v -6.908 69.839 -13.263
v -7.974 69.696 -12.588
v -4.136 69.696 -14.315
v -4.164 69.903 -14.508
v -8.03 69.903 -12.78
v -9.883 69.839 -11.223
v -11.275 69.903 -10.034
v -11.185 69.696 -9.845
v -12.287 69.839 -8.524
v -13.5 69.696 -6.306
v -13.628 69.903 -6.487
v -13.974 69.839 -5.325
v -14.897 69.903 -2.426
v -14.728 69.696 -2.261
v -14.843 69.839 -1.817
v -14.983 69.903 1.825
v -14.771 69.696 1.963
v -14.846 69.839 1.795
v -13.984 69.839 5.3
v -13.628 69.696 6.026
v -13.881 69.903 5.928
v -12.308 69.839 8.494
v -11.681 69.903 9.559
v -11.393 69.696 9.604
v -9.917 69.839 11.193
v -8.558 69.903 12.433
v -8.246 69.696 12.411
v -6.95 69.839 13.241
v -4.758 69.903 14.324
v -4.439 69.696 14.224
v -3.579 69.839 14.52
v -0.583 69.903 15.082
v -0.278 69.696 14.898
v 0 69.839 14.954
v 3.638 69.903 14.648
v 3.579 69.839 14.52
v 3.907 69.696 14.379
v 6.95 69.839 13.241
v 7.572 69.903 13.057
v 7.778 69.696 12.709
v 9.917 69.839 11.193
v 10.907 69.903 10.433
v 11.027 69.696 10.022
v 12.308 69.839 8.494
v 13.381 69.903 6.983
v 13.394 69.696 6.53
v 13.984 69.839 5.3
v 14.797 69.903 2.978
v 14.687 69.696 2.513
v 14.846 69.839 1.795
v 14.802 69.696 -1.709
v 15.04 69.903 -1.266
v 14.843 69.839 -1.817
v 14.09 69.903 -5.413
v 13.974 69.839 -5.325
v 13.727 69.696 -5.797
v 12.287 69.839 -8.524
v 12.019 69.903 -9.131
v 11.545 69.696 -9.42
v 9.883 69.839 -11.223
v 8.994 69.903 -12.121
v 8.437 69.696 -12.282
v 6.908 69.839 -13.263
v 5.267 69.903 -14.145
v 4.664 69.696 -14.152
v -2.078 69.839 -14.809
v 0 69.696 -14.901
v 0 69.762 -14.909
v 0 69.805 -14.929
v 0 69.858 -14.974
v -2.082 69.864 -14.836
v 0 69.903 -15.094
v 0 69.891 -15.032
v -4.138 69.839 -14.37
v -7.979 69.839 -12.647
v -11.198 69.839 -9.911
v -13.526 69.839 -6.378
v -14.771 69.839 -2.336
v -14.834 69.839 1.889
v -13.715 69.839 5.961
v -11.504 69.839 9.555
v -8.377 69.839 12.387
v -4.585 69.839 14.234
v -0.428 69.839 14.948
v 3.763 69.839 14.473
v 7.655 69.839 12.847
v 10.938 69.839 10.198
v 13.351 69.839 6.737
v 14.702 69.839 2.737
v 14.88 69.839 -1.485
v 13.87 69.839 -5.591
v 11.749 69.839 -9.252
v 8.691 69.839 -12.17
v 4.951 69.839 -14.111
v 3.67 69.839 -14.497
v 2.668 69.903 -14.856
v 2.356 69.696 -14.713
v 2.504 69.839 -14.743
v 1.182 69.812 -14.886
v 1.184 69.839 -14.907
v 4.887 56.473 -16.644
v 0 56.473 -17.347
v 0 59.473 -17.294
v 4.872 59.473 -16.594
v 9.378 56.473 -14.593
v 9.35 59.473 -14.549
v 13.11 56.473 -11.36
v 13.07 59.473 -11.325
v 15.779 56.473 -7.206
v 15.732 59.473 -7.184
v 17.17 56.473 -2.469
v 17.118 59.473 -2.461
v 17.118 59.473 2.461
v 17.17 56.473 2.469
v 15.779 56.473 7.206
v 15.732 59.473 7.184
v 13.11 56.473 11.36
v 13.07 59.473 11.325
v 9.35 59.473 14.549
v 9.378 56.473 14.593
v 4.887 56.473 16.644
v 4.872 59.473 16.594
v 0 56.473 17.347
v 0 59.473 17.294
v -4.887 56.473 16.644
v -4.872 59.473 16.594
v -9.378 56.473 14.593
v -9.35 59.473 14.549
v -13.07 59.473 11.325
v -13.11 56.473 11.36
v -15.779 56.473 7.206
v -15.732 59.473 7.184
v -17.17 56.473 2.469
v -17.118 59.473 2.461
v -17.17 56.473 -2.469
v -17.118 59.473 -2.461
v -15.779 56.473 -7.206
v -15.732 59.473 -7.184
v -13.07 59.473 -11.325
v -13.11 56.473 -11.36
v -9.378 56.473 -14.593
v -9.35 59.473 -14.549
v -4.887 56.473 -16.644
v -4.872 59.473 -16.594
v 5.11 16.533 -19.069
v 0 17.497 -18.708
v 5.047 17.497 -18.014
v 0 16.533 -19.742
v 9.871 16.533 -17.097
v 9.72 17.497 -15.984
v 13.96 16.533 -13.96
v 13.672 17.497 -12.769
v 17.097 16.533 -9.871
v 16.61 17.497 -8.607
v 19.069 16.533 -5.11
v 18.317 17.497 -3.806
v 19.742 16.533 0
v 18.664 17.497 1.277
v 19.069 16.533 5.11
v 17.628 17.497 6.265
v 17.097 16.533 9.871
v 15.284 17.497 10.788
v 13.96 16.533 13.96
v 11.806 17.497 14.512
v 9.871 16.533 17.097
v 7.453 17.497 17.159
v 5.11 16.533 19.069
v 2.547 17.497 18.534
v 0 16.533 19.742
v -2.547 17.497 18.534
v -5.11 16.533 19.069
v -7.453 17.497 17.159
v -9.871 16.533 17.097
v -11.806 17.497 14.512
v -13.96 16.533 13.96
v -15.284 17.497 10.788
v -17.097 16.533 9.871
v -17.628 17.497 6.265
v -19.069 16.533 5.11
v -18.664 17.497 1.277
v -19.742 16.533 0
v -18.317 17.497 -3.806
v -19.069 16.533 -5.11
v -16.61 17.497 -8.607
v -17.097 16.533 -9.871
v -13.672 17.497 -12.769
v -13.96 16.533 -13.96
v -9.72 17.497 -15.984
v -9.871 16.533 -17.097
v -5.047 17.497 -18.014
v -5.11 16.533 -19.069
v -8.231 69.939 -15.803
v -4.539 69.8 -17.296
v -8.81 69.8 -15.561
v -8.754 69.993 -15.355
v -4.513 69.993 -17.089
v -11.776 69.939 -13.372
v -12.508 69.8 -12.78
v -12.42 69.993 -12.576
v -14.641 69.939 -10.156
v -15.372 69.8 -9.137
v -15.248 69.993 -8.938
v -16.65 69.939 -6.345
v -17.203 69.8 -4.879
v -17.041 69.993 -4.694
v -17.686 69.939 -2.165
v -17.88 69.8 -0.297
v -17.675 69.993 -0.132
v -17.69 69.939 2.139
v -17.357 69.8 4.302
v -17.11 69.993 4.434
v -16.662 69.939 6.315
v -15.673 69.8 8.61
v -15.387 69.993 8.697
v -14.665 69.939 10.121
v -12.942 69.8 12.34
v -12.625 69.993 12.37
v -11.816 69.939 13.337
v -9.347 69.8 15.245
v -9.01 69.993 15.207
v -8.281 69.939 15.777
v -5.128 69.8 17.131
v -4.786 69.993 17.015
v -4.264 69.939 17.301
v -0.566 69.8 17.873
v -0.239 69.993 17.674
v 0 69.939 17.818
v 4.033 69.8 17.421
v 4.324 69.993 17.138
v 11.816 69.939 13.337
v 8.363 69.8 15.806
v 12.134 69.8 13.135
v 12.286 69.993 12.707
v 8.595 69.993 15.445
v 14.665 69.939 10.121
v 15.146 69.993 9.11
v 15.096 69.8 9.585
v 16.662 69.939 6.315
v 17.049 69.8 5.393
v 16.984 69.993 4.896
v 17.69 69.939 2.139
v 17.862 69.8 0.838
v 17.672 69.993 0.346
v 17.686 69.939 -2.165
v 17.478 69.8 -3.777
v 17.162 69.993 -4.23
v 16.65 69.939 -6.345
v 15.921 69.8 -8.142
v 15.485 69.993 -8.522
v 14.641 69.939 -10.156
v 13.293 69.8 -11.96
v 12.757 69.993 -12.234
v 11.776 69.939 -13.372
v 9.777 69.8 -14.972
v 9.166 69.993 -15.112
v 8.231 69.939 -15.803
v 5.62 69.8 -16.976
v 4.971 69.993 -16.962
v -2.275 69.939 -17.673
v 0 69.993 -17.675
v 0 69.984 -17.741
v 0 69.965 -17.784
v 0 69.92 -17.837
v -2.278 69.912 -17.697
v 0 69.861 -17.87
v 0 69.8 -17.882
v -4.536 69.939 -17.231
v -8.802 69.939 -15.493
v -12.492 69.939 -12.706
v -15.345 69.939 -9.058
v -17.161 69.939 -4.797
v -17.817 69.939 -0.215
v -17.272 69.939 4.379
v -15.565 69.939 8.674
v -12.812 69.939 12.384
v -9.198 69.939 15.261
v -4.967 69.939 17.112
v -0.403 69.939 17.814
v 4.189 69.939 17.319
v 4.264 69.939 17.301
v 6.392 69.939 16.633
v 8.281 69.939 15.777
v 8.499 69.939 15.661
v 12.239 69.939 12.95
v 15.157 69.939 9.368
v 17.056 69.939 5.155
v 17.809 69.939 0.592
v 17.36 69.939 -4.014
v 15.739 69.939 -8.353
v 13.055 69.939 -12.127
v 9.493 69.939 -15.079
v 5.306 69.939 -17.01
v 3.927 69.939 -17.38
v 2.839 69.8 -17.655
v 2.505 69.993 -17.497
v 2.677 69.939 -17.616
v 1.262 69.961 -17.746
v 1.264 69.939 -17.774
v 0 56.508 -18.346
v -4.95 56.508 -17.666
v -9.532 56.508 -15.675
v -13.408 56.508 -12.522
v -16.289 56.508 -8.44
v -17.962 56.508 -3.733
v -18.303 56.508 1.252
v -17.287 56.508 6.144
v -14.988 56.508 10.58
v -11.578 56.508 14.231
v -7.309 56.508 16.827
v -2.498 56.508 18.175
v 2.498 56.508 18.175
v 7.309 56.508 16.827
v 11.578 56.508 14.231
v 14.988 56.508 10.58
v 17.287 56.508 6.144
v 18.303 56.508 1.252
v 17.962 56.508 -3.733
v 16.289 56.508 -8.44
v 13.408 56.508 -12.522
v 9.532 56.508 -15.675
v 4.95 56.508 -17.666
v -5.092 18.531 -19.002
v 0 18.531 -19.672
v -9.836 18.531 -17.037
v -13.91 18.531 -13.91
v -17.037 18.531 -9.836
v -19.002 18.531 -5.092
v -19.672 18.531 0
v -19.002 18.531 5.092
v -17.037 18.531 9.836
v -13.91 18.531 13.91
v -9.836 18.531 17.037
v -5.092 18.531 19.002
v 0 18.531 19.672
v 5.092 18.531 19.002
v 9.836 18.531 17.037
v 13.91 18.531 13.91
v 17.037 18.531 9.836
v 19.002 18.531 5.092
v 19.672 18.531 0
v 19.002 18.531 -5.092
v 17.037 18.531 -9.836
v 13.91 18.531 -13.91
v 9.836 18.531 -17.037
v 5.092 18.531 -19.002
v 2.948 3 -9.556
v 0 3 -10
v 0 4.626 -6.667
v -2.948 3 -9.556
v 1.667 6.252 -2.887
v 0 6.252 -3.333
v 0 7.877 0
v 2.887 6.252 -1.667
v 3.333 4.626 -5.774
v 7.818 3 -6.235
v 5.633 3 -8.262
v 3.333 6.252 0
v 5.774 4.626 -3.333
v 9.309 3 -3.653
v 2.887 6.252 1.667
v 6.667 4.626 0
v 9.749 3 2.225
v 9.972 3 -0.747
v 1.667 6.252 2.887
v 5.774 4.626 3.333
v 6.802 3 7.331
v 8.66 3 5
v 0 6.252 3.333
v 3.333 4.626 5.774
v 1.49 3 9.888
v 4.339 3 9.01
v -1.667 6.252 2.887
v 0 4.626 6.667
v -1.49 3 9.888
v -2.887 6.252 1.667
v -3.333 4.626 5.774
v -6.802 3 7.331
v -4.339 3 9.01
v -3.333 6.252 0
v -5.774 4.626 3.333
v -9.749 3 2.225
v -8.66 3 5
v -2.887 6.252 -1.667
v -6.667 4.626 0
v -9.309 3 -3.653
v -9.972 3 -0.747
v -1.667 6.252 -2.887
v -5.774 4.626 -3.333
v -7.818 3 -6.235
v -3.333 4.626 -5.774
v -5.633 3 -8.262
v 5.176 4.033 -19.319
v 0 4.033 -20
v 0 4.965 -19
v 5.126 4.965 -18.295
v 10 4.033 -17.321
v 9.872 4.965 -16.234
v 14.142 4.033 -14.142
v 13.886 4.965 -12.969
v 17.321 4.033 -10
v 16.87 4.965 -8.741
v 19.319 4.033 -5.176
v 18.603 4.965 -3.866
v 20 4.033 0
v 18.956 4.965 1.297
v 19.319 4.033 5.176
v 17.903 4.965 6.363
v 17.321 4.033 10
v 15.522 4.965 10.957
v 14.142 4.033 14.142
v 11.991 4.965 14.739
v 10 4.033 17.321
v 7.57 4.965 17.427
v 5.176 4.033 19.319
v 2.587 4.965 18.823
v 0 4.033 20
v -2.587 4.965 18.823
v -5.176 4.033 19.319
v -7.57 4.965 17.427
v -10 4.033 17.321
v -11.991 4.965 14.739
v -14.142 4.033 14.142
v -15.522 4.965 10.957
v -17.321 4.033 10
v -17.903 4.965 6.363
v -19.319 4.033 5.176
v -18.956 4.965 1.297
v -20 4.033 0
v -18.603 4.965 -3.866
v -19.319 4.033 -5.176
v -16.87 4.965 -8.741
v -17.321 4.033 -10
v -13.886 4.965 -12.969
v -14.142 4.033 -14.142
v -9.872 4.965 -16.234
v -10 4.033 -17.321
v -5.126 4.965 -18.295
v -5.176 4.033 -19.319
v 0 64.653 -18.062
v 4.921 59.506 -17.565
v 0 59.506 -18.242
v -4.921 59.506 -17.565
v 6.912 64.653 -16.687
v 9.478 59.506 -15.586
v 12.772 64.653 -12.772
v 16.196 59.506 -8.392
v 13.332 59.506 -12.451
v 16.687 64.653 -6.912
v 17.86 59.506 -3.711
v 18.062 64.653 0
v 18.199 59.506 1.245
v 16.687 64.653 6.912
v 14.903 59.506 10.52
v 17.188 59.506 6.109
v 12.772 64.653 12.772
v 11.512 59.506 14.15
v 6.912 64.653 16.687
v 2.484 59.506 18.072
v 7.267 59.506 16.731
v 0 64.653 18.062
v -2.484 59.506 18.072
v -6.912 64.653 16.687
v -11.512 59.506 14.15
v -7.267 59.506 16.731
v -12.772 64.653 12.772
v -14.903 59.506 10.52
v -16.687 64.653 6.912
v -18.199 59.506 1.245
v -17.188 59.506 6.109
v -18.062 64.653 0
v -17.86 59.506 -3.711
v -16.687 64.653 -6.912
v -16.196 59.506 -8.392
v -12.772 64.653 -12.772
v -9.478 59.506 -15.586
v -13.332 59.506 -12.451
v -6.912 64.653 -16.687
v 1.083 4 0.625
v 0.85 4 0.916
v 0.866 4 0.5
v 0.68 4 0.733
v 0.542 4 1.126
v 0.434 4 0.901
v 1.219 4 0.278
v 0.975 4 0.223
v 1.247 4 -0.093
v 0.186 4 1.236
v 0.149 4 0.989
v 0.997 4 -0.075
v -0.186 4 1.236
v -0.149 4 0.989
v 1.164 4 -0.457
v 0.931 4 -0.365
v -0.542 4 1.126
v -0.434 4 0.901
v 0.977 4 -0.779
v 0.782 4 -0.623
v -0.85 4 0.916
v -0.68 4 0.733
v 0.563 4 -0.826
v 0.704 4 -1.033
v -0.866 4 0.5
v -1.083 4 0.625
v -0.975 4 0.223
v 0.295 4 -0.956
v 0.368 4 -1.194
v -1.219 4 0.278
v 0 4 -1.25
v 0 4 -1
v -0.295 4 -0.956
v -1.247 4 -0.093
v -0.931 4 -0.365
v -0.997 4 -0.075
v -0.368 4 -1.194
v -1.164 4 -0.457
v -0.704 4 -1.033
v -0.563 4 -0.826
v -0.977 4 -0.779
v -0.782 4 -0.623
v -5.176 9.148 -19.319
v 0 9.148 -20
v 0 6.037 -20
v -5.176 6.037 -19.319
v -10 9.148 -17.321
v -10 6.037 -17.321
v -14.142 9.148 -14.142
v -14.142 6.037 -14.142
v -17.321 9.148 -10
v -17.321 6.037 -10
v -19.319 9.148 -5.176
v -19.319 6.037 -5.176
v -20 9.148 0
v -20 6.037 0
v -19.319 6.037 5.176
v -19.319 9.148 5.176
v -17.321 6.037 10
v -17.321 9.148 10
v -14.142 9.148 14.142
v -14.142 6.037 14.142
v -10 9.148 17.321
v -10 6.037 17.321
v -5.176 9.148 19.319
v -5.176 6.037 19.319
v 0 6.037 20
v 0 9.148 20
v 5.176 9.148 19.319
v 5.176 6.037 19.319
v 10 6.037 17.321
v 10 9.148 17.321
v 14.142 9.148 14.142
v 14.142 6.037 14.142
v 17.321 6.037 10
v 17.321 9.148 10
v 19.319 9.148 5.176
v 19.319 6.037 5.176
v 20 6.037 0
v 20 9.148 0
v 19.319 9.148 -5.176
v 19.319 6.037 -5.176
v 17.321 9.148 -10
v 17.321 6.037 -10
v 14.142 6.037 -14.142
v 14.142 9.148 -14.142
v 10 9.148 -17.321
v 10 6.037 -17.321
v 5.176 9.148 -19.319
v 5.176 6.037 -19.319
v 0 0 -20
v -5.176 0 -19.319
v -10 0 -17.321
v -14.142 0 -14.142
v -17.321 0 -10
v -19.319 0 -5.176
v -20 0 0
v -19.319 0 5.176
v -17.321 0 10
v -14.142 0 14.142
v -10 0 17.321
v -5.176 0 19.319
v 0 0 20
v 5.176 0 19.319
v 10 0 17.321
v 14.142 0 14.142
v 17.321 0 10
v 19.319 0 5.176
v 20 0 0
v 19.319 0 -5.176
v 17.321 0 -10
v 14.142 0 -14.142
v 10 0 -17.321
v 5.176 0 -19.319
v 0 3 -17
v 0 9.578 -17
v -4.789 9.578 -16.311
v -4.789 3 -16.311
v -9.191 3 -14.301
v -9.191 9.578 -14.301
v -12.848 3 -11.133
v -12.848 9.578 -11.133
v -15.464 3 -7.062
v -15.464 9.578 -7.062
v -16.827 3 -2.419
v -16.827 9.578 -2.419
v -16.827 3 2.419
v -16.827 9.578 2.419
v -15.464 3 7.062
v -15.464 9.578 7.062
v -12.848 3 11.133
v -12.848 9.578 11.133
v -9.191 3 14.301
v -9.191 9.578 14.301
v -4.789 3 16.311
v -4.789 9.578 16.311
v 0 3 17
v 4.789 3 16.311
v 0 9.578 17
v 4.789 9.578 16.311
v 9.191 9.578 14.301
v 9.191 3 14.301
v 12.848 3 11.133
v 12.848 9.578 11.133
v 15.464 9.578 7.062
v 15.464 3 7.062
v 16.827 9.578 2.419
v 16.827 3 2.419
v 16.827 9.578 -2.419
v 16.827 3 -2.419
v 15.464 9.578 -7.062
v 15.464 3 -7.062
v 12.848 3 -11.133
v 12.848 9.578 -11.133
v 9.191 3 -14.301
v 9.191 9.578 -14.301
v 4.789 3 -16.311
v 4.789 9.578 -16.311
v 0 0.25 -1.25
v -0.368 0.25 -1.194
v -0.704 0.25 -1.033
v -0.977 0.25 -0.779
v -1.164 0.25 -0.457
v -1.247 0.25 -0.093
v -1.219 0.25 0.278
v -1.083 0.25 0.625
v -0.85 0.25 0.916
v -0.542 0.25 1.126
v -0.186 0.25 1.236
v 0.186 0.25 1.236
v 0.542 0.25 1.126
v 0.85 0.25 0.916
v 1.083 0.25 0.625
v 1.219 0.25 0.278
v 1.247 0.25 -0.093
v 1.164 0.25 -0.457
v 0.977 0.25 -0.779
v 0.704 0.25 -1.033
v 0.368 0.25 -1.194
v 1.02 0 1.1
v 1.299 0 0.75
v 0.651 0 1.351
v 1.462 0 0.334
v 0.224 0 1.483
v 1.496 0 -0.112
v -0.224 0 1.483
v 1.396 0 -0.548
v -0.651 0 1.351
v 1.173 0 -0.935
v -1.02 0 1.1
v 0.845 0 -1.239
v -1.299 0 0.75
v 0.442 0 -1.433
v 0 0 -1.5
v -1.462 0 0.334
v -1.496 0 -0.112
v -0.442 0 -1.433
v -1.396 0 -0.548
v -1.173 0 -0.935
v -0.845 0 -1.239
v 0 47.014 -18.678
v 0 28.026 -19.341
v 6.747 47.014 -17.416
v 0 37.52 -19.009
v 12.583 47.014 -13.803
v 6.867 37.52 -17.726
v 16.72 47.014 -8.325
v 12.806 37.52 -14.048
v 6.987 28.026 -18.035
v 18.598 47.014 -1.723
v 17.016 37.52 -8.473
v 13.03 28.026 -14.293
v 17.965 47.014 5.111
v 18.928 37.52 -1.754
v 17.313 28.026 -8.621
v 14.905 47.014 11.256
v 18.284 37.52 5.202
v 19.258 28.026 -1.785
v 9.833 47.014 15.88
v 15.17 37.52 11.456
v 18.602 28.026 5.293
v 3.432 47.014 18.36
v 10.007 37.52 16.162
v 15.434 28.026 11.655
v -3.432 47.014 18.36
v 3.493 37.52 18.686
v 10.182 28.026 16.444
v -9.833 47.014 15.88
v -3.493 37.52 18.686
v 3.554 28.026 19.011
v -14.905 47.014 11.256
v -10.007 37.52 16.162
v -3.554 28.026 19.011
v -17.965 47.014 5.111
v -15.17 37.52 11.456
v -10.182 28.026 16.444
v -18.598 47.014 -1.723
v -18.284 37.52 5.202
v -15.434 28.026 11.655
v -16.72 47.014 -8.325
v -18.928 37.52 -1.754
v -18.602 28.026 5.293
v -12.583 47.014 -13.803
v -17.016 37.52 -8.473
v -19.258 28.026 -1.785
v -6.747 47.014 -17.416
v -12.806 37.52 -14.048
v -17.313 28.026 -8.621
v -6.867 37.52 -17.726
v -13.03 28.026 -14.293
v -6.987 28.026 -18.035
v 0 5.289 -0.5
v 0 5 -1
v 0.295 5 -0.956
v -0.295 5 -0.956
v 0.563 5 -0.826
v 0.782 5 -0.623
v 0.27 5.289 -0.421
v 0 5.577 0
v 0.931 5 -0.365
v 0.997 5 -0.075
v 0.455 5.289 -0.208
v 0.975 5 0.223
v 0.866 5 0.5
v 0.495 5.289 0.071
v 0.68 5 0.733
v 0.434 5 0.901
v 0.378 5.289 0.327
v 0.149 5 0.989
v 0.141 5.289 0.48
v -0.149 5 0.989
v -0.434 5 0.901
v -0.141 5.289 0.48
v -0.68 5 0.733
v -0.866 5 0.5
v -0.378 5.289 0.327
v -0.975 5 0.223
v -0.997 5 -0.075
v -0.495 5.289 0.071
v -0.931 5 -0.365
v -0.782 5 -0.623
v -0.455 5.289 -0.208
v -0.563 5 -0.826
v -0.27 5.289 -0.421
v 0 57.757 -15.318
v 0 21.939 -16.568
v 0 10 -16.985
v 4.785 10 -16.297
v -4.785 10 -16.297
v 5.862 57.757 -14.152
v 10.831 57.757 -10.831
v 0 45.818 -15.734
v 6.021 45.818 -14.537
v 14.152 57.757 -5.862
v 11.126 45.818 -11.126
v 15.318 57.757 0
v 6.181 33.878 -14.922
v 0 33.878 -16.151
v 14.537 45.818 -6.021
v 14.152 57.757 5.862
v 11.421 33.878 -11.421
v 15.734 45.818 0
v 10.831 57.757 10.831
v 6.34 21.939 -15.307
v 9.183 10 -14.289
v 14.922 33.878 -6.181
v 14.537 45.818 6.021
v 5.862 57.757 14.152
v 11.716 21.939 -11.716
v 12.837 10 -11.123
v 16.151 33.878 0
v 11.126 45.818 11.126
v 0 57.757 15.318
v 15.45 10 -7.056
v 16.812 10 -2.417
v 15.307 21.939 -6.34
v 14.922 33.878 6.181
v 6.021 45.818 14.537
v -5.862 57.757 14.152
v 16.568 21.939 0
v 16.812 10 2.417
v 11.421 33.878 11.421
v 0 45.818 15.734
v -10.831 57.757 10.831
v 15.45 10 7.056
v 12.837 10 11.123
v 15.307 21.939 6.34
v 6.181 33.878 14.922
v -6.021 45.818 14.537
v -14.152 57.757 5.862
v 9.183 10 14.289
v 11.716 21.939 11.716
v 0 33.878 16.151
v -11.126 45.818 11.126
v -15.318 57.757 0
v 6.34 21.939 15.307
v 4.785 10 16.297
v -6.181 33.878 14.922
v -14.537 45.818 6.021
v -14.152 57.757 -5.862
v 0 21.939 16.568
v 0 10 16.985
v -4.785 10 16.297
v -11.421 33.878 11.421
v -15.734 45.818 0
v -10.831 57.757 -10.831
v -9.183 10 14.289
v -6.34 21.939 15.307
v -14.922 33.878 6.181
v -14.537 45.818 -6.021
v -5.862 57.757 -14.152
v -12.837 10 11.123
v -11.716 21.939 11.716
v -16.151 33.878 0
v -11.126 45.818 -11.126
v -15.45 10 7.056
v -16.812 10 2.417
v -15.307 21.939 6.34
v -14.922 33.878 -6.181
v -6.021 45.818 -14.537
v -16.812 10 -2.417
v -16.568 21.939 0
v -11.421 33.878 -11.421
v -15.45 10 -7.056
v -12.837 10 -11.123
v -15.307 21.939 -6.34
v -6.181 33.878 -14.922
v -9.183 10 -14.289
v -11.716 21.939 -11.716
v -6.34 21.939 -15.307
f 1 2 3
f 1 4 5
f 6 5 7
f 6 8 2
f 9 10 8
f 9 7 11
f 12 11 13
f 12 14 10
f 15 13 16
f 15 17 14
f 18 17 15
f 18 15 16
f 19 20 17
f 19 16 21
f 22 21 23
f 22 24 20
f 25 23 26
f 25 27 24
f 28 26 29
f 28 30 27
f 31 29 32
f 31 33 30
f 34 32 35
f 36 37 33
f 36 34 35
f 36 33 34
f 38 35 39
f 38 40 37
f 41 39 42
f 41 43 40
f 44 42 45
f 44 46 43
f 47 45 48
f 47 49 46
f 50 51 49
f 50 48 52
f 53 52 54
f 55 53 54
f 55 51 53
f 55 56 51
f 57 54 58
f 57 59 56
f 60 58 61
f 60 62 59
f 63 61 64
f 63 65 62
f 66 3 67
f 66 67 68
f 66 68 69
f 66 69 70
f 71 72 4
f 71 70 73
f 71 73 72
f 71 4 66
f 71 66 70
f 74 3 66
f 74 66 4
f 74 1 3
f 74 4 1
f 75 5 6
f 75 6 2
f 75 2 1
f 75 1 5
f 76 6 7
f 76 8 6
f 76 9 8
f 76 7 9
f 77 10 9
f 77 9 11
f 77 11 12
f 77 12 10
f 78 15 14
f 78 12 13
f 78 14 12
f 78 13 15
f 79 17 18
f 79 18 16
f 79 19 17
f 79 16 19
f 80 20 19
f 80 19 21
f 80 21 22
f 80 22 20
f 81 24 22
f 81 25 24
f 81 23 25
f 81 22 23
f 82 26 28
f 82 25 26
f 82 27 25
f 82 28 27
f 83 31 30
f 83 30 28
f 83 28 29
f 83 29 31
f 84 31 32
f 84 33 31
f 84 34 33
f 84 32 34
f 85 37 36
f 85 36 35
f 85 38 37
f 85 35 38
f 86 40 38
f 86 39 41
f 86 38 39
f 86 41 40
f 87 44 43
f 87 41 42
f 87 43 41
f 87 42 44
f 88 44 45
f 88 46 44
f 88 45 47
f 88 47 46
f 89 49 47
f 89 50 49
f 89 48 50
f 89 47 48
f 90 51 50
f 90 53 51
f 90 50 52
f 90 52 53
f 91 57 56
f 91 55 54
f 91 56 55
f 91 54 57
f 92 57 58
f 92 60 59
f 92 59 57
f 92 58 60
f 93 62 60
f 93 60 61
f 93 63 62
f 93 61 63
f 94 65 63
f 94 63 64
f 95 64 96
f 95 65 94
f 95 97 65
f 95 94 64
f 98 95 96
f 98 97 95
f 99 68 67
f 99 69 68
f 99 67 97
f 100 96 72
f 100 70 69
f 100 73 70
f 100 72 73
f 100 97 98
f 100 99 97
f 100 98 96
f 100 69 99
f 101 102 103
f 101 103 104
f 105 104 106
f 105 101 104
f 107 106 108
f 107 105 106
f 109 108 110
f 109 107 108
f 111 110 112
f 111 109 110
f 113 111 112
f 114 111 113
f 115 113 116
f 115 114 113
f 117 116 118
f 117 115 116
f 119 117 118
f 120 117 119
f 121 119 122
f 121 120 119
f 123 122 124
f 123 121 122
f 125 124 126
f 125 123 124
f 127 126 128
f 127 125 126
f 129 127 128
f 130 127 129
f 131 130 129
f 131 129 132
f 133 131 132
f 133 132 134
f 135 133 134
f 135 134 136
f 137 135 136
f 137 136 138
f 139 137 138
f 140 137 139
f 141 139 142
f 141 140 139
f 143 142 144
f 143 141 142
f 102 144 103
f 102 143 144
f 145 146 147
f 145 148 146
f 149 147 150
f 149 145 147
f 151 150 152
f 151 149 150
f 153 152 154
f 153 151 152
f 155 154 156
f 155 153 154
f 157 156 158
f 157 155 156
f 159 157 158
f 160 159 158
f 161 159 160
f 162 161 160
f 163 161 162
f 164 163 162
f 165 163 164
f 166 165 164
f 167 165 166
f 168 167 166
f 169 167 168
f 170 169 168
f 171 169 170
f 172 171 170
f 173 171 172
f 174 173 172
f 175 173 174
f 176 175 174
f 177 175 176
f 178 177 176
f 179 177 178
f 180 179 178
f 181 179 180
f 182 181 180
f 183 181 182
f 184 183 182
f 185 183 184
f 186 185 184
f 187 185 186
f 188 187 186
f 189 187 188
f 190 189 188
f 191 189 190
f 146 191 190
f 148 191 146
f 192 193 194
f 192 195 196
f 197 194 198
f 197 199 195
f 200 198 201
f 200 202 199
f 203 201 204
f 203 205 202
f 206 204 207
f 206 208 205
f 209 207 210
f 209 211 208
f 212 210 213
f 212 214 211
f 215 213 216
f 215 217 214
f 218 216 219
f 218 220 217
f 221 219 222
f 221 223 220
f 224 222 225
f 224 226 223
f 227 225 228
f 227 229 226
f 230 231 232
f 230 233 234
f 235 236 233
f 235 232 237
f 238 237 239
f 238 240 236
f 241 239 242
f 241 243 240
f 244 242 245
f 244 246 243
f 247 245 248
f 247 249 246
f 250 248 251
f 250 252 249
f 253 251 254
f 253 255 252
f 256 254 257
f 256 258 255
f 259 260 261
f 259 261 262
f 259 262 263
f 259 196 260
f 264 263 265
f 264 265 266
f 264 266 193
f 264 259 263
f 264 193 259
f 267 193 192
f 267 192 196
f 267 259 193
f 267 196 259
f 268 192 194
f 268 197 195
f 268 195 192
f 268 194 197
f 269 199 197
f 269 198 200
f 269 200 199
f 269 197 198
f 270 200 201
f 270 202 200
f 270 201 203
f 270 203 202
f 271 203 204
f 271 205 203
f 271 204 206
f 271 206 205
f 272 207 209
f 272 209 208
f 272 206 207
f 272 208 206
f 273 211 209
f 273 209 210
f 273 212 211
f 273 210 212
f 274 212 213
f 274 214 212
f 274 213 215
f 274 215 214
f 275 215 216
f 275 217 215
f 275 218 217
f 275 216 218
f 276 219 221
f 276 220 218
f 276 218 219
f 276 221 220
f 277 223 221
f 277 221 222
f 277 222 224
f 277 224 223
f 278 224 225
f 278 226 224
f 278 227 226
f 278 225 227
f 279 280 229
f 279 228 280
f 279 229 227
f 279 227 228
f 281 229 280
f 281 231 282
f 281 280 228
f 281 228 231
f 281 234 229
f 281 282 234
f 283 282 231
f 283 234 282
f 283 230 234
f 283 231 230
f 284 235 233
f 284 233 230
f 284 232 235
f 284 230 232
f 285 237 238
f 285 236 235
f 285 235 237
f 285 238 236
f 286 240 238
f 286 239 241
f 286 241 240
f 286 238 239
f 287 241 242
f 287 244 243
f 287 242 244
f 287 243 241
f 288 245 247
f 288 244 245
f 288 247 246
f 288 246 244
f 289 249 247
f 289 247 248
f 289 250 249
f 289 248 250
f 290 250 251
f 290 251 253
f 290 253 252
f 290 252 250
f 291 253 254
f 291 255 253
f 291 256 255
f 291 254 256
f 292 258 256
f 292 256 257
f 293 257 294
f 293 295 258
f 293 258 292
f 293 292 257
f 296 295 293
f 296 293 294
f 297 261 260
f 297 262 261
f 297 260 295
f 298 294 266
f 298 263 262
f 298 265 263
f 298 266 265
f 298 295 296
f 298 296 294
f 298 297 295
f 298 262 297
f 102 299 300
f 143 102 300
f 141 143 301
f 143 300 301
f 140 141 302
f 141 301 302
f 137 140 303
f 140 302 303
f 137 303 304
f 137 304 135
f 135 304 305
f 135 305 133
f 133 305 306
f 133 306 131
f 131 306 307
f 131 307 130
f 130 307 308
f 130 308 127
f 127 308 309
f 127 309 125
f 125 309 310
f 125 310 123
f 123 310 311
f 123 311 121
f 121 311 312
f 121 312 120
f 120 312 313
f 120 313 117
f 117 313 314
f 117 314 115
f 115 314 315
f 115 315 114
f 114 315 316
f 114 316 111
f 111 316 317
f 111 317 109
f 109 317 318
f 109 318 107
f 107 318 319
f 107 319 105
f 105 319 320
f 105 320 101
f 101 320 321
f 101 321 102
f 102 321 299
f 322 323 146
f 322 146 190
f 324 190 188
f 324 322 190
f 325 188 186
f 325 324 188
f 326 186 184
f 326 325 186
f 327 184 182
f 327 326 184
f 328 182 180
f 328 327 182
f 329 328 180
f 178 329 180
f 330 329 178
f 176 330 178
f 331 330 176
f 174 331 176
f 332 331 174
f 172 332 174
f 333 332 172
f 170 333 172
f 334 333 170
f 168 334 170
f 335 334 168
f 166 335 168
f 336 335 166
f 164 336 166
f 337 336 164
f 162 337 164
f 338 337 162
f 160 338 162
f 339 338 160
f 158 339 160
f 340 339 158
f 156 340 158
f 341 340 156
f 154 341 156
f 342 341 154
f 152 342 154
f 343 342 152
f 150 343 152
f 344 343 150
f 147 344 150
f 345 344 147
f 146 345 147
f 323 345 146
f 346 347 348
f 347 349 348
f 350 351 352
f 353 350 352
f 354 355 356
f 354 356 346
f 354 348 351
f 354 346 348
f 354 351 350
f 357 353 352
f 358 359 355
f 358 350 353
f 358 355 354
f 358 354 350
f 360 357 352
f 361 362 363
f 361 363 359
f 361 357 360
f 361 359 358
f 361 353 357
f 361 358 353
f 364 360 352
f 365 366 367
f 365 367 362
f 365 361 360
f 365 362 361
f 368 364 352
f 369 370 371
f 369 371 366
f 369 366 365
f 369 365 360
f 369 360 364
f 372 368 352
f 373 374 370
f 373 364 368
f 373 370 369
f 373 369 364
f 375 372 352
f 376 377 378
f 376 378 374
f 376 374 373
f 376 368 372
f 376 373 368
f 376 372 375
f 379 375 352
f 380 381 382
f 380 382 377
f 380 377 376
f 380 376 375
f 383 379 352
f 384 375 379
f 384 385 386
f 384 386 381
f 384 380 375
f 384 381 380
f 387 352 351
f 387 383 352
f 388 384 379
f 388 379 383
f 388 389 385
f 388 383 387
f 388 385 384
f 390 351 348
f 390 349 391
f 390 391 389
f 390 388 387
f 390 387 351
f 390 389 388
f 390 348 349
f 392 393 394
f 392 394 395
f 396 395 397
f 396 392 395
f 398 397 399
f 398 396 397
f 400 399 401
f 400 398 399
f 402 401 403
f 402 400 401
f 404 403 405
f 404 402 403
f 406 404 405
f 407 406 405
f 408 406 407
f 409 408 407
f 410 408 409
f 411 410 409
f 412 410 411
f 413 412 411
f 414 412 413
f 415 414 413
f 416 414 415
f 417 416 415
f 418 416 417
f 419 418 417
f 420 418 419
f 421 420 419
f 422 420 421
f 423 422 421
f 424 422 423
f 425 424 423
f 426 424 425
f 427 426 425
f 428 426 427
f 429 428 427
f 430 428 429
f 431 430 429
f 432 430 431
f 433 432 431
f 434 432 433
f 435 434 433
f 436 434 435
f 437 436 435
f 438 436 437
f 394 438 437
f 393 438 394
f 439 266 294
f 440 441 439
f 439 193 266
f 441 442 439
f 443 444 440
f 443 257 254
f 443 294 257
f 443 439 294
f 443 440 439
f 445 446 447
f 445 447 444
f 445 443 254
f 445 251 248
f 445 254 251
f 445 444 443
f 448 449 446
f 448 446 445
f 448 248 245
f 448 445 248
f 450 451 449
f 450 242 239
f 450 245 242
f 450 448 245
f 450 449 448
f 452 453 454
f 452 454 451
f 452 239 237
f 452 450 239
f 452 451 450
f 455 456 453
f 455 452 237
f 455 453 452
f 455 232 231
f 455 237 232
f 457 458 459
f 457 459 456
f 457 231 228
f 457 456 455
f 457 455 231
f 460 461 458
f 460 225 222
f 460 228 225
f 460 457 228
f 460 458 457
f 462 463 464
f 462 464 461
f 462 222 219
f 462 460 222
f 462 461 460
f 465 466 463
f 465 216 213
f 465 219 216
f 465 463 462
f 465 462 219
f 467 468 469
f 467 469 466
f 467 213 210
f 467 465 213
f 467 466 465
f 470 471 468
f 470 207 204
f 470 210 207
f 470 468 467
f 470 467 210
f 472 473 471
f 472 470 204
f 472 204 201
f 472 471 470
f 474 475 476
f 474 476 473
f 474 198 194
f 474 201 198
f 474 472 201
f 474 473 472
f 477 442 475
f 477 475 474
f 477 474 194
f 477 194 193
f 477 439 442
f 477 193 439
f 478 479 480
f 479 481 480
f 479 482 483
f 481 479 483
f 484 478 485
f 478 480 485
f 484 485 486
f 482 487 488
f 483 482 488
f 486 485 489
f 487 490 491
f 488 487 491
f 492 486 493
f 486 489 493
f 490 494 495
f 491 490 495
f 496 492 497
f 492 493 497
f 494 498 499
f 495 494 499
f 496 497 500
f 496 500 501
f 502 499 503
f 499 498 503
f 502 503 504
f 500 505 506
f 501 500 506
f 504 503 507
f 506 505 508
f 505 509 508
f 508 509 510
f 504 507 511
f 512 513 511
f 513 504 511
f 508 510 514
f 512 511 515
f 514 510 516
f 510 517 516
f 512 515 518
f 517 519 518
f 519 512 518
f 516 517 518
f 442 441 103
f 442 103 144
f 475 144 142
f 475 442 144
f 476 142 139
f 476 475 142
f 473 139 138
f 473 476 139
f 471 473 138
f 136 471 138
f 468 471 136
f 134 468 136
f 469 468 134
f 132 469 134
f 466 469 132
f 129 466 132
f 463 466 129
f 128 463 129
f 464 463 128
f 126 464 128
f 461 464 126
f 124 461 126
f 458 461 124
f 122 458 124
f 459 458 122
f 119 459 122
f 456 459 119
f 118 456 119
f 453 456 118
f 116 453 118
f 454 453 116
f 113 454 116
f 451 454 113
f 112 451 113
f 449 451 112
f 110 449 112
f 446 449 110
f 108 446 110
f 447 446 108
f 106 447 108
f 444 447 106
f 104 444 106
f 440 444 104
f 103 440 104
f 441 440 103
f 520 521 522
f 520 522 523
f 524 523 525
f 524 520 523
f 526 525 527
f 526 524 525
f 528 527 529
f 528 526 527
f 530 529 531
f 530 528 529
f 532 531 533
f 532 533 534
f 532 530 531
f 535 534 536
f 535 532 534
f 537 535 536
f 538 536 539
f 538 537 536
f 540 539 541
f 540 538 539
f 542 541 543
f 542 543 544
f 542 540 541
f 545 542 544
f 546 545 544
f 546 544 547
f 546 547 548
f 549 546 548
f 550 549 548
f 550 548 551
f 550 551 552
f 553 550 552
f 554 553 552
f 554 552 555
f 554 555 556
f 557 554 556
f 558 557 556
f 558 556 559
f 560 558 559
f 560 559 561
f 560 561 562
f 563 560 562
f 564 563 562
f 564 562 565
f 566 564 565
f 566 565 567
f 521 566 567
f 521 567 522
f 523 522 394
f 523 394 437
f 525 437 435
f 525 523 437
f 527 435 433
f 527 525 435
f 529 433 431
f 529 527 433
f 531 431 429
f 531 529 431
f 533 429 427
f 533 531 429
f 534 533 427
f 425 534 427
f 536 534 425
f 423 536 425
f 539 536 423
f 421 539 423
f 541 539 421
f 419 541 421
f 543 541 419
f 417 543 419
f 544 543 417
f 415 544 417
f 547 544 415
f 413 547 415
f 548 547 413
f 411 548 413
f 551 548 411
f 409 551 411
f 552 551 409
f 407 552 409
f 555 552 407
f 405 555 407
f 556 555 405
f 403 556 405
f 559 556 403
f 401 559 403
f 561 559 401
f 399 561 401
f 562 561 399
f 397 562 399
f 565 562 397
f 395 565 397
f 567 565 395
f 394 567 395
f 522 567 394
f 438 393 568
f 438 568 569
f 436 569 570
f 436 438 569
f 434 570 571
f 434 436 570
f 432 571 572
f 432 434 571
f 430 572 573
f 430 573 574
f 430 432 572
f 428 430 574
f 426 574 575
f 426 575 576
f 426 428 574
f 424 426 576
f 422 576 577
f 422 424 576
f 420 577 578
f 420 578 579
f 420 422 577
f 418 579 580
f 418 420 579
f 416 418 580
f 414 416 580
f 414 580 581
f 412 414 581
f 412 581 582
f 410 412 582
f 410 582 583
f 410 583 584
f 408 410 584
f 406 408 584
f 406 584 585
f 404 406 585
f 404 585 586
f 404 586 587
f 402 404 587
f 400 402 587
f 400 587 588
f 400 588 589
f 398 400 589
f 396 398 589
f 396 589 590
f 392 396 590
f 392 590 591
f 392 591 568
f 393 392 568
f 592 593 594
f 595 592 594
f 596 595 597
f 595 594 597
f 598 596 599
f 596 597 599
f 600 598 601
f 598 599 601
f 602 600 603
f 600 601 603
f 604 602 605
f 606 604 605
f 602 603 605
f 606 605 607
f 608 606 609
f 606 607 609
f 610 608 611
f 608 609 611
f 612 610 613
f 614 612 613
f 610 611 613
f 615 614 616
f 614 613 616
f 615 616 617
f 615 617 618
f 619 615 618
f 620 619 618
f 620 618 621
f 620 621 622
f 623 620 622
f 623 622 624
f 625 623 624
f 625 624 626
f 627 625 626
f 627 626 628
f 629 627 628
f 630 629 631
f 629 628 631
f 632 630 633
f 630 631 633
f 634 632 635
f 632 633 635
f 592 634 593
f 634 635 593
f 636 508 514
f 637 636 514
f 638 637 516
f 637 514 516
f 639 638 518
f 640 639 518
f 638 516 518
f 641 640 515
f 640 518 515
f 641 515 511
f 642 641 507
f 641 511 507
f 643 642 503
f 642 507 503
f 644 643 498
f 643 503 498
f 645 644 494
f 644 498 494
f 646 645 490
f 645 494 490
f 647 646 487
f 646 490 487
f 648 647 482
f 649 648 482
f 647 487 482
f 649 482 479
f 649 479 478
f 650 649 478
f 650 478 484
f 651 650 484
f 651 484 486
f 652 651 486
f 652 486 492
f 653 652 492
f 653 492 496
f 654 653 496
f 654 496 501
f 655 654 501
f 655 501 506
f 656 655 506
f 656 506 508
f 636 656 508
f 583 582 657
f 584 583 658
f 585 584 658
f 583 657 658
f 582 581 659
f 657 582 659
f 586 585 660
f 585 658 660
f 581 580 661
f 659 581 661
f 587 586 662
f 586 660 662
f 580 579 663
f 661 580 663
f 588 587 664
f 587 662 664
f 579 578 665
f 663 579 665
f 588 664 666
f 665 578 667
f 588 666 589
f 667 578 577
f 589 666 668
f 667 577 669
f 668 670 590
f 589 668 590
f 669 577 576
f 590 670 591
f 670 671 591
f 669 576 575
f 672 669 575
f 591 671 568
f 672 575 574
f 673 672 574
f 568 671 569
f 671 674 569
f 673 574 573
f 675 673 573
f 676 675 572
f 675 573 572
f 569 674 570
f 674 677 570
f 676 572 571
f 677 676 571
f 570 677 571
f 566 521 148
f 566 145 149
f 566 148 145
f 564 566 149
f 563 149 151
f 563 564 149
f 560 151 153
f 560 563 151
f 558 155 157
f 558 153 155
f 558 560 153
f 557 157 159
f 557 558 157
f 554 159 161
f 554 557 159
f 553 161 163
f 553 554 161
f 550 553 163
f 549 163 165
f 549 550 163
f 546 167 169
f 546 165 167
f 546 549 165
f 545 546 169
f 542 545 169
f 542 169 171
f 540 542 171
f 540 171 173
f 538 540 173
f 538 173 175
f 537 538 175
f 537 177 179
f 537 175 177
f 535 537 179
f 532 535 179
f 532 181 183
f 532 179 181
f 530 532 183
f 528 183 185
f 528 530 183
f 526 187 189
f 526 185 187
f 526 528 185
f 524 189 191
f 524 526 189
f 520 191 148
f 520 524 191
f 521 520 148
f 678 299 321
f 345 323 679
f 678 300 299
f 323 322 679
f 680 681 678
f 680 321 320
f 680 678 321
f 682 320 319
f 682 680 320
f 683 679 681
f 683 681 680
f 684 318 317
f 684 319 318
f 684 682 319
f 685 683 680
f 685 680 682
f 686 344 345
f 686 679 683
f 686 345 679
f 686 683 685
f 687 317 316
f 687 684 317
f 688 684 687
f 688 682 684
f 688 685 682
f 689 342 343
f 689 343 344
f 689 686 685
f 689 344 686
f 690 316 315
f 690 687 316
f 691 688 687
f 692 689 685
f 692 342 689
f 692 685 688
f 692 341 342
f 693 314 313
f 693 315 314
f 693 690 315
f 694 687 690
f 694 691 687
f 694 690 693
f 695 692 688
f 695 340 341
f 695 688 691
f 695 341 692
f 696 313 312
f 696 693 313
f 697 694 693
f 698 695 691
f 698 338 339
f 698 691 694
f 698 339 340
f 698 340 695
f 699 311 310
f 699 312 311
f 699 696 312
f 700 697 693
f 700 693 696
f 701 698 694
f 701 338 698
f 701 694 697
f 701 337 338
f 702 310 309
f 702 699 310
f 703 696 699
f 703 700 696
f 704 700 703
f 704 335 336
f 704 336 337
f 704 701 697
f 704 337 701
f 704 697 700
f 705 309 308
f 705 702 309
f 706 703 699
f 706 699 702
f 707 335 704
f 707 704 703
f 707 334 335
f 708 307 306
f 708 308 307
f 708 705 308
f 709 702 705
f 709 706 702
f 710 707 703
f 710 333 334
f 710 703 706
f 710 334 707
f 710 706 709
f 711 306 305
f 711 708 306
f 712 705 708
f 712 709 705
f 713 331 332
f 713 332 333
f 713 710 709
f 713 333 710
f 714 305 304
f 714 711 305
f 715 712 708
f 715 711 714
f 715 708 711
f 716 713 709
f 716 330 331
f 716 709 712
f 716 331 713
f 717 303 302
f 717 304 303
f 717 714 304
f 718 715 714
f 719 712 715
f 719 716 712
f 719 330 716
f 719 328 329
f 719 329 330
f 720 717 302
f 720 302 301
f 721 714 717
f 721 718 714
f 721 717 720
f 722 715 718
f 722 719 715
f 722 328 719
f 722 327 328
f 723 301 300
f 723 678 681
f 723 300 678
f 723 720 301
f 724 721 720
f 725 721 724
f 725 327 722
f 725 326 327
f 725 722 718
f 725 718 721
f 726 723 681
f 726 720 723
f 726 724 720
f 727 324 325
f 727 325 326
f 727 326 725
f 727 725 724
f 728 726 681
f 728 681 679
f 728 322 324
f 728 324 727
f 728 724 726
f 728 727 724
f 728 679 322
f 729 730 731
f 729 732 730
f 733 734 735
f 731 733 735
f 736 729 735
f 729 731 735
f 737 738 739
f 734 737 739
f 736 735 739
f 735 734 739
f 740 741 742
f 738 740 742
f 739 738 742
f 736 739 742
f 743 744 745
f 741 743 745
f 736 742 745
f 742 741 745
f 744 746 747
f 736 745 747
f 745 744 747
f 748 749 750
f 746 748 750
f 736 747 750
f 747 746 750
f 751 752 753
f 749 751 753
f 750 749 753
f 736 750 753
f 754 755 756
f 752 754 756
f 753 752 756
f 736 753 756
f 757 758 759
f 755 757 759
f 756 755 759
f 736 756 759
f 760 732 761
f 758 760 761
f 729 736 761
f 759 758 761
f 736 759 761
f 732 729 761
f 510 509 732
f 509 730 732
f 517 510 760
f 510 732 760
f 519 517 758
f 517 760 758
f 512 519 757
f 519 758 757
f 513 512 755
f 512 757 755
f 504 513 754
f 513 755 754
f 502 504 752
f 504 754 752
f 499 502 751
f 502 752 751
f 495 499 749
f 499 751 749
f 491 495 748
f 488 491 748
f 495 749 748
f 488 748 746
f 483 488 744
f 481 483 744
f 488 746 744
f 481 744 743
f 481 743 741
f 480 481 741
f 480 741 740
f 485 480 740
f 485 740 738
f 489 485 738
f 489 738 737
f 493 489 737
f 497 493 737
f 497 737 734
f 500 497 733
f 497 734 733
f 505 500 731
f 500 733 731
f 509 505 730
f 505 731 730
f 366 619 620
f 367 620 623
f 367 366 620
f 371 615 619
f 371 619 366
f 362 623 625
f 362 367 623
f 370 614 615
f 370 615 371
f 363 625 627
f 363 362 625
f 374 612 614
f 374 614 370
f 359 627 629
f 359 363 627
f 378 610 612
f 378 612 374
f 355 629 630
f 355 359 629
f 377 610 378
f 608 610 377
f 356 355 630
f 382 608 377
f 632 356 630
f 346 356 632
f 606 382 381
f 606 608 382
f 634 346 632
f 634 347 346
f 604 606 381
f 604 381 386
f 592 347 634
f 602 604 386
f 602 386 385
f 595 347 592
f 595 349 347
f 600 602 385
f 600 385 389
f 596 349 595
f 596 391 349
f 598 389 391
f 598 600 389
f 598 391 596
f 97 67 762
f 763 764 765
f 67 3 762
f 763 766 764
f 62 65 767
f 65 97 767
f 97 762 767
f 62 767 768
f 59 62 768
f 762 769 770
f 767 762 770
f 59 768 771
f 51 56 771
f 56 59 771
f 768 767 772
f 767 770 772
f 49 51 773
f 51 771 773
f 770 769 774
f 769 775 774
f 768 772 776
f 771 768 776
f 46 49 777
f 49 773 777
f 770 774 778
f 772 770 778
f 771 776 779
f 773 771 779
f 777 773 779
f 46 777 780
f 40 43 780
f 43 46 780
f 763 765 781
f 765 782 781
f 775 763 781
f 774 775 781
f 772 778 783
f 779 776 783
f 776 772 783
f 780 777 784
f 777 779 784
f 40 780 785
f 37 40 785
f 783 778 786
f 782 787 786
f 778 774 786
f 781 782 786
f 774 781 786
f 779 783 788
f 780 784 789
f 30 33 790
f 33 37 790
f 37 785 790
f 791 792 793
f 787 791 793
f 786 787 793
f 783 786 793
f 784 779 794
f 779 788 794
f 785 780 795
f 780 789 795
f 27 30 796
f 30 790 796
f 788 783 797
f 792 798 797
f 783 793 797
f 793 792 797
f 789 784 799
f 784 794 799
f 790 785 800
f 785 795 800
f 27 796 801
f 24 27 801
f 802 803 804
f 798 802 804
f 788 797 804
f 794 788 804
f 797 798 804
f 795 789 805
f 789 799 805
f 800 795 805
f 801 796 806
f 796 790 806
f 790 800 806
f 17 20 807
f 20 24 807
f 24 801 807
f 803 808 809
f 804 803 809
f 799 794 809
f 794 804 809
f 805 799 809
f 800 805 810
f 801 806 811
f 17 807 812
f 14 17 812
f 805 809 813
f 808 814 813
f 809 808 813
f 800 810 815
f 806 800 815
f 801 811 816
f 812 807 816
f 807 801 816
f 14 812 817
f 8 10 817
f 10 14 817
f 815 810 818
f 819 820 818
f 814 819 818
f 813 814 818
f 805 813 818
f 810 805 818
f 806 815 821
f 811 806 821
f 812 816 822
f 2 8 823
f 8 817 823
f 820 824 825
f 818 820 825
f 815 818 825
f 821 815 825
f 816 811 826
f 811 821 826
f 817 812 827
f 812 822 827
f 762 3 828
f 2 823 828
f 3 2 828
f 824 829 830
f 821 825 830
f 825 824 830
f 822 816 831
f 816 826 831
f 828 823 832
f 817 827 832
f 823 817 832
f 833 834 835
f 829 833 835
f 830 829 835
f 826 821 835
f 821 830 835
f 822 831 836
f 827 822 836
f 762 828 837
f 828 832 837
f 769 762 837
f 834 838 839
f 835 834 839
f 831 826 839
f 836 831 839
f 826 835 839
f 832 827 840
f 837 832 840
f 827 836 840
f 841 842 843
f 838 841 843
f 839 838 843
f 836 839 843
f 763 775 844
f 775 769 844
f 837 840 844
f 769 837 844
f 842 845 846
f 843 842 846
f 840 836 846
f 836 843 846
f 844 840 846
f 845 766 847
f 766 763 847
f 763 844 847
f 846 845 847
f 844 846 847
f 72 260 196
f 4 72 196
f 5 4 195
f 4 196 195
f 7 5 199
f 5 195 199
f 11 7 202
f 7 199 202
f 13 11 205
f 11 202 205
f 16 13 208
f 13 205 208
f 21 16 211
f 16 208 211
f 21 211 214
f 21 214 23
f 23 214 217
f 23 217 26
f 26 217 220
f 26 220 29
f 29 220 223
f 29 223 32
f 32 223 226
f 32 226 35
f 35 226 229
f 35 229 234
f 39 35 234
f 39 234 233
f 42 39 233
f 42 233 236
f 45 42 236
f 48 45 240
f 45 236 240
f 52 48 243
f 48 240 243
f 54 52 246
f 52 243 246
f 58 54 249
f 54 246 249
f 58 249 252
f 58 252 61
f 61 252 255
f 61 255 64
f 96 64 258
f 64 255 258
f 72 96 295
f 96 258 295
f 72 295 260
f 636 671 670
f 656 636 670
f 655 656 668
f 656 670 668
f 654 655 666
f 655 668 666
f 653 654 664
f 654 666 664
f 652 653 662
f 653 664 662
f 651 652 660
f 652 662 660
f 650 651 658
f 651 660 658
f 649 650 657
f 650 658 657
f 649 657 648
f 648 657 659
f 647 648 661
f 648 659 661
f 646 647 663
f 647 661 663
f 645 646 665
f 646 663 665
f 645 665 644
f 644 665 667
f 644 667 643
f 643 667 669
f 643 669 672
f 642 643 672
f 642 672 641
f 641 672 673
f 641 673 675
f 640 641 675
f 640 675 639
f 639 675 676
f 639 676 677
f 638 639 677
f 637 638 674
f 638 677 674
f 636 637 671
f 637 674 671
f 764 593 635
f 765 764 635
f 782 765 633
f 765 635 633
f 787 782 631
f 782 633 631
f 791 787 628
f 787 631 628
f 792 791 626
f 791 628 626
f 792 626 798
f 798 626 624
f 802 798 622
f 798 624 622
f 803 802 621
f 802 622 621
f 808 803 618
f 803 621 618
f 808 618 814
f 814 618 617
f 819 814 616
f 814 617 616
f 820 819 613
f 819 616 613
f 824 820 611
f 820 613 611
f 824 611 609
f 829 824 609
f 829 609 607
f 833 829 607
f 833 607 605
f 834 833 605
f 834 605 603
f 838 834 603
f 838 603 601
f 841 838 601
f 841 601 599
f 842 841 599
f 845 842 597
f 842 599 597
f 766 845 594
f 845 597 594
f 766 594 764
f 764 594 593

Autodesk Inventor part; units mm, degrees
ref_plane "YZ Plane" through (0, 0, 0) normal (1, 0, 0) x (0, 1, 0)
ref_plane "XZ Plane" through (0, 0, 0) normal (0, 1, 0) x (-1, 0, 0)
ref_plane "XY Plane" through (0, 0, 0) normal (0, 0, 1) x (1, 0, 0)
sketch "Sketch1" plane through (0, 0, 0) normal (1, 0, 0) x (0, 1, 0)
  line L0 (-20, 0) -> (70, 0)
  line L1 (0, 0) -> (0, -20)
  line L2 (0, -20) -> (9.148, -20)
  line L3 (9.148, -20) -> (70, -17.875)
  line L4 (70, 0) -> (70, -17.875)
  line L5 (3, -10) -> (3, -17)
  line L6 (7.8773, 0) -> (3, -10)
  line L7 (7.8773, 0) -> (19.0033, 0) construction
  line L8 (10, 0) -> (10, -16.9852)
  line L9 (9.5775, -17) -> (70, -14.89)
  line L10 (3, -17) -> (9.5775, -17)
  line L11 (70, -17.875) -> (69.8959, -14.8936)
  line L12 (6.0374, -20) -> (4.9651, -19)
  line L13 (4.9651, -19) -> (4.0326, -20)
  line L14 (4.9651, -19) -> (5, -20)
  line L15 (17.532, -19.7072) -> (17.4971, -18.7078)
  line L16 (17.4971, -18.7078) -> (18.5314, -19.6723)
  line L17 (17.4971, -18.7078) -> (16.5326, -19.7421)
  line L18 (59.5059, -18.2415) -> (56.5082, -18.3461)
  line L19 (56.5082, -18.3461) -> (56.4733, -17.3468)
  line L20 (56.4733, -17.3468) -> (59.4729, -17.2944)
  line L21 (59.4729, -17.2944) -> (59.5059, -18.2415)
  line L22 (0.5, 0) -> (0.5, -1)
  line L23 (0, -1.5) -> (0.5, -1)
  line L24 (0.5, -1) -> (5, -1)
  line L25 (5, -1) -> (5.5774, 0)
  line L26 (0.25, -1.25) -> (4, -1.25)
  line L27 (4, -1.25) -> (4, 0)
  point P0 (4, -1)
  dimension "d0" = 90
  dimension "d1" = 20
  dimension "d4" = 70
  dimension "d5" = 3
  dimension "d6" = 116
  dimension "d8" = 10
  dimension "d10" = 7
  dimension "d14" = 17.875
  dimension "d15" = 14.89
  dimension "d16" = 88
  dimension "d17" = 88
  dimension "d18" = 90
  dimension "d22" = 5
  dimension "d23" = 1
  dimension "d24" = 1
  dimension "d25" = 52.5
  dimension "d26" = 3
  dimension "d27" = 1
  dimension "d28" = 13.5
  dimension "d29" = 0.5
  dimension "d33" = 4.5
  dimension "d34" = 60
  dimension "d35" = 1.25
  dimension "d36" = 4
revolve "Revolution1" add sketch "Sketch1" angle 360 about axis through (0, -20, 0) along (0, 1, 0) contours L23 L26 L27 L24 L25 L0 L6 L5 L10 L9 L11 L3 L21 L20 L19 L16 L17 L2 L12 L13 L1
fillet "Fillet1" radius 0.2 2 edges at (0, 70, 17.875) (0, 69.8959, 14.8936)
thread "Thread2" size "M2.5x0.45" class "6H" standard "ANSI Metric M Profile" length 3.5
properties material "Aluminum 2014-T6"
